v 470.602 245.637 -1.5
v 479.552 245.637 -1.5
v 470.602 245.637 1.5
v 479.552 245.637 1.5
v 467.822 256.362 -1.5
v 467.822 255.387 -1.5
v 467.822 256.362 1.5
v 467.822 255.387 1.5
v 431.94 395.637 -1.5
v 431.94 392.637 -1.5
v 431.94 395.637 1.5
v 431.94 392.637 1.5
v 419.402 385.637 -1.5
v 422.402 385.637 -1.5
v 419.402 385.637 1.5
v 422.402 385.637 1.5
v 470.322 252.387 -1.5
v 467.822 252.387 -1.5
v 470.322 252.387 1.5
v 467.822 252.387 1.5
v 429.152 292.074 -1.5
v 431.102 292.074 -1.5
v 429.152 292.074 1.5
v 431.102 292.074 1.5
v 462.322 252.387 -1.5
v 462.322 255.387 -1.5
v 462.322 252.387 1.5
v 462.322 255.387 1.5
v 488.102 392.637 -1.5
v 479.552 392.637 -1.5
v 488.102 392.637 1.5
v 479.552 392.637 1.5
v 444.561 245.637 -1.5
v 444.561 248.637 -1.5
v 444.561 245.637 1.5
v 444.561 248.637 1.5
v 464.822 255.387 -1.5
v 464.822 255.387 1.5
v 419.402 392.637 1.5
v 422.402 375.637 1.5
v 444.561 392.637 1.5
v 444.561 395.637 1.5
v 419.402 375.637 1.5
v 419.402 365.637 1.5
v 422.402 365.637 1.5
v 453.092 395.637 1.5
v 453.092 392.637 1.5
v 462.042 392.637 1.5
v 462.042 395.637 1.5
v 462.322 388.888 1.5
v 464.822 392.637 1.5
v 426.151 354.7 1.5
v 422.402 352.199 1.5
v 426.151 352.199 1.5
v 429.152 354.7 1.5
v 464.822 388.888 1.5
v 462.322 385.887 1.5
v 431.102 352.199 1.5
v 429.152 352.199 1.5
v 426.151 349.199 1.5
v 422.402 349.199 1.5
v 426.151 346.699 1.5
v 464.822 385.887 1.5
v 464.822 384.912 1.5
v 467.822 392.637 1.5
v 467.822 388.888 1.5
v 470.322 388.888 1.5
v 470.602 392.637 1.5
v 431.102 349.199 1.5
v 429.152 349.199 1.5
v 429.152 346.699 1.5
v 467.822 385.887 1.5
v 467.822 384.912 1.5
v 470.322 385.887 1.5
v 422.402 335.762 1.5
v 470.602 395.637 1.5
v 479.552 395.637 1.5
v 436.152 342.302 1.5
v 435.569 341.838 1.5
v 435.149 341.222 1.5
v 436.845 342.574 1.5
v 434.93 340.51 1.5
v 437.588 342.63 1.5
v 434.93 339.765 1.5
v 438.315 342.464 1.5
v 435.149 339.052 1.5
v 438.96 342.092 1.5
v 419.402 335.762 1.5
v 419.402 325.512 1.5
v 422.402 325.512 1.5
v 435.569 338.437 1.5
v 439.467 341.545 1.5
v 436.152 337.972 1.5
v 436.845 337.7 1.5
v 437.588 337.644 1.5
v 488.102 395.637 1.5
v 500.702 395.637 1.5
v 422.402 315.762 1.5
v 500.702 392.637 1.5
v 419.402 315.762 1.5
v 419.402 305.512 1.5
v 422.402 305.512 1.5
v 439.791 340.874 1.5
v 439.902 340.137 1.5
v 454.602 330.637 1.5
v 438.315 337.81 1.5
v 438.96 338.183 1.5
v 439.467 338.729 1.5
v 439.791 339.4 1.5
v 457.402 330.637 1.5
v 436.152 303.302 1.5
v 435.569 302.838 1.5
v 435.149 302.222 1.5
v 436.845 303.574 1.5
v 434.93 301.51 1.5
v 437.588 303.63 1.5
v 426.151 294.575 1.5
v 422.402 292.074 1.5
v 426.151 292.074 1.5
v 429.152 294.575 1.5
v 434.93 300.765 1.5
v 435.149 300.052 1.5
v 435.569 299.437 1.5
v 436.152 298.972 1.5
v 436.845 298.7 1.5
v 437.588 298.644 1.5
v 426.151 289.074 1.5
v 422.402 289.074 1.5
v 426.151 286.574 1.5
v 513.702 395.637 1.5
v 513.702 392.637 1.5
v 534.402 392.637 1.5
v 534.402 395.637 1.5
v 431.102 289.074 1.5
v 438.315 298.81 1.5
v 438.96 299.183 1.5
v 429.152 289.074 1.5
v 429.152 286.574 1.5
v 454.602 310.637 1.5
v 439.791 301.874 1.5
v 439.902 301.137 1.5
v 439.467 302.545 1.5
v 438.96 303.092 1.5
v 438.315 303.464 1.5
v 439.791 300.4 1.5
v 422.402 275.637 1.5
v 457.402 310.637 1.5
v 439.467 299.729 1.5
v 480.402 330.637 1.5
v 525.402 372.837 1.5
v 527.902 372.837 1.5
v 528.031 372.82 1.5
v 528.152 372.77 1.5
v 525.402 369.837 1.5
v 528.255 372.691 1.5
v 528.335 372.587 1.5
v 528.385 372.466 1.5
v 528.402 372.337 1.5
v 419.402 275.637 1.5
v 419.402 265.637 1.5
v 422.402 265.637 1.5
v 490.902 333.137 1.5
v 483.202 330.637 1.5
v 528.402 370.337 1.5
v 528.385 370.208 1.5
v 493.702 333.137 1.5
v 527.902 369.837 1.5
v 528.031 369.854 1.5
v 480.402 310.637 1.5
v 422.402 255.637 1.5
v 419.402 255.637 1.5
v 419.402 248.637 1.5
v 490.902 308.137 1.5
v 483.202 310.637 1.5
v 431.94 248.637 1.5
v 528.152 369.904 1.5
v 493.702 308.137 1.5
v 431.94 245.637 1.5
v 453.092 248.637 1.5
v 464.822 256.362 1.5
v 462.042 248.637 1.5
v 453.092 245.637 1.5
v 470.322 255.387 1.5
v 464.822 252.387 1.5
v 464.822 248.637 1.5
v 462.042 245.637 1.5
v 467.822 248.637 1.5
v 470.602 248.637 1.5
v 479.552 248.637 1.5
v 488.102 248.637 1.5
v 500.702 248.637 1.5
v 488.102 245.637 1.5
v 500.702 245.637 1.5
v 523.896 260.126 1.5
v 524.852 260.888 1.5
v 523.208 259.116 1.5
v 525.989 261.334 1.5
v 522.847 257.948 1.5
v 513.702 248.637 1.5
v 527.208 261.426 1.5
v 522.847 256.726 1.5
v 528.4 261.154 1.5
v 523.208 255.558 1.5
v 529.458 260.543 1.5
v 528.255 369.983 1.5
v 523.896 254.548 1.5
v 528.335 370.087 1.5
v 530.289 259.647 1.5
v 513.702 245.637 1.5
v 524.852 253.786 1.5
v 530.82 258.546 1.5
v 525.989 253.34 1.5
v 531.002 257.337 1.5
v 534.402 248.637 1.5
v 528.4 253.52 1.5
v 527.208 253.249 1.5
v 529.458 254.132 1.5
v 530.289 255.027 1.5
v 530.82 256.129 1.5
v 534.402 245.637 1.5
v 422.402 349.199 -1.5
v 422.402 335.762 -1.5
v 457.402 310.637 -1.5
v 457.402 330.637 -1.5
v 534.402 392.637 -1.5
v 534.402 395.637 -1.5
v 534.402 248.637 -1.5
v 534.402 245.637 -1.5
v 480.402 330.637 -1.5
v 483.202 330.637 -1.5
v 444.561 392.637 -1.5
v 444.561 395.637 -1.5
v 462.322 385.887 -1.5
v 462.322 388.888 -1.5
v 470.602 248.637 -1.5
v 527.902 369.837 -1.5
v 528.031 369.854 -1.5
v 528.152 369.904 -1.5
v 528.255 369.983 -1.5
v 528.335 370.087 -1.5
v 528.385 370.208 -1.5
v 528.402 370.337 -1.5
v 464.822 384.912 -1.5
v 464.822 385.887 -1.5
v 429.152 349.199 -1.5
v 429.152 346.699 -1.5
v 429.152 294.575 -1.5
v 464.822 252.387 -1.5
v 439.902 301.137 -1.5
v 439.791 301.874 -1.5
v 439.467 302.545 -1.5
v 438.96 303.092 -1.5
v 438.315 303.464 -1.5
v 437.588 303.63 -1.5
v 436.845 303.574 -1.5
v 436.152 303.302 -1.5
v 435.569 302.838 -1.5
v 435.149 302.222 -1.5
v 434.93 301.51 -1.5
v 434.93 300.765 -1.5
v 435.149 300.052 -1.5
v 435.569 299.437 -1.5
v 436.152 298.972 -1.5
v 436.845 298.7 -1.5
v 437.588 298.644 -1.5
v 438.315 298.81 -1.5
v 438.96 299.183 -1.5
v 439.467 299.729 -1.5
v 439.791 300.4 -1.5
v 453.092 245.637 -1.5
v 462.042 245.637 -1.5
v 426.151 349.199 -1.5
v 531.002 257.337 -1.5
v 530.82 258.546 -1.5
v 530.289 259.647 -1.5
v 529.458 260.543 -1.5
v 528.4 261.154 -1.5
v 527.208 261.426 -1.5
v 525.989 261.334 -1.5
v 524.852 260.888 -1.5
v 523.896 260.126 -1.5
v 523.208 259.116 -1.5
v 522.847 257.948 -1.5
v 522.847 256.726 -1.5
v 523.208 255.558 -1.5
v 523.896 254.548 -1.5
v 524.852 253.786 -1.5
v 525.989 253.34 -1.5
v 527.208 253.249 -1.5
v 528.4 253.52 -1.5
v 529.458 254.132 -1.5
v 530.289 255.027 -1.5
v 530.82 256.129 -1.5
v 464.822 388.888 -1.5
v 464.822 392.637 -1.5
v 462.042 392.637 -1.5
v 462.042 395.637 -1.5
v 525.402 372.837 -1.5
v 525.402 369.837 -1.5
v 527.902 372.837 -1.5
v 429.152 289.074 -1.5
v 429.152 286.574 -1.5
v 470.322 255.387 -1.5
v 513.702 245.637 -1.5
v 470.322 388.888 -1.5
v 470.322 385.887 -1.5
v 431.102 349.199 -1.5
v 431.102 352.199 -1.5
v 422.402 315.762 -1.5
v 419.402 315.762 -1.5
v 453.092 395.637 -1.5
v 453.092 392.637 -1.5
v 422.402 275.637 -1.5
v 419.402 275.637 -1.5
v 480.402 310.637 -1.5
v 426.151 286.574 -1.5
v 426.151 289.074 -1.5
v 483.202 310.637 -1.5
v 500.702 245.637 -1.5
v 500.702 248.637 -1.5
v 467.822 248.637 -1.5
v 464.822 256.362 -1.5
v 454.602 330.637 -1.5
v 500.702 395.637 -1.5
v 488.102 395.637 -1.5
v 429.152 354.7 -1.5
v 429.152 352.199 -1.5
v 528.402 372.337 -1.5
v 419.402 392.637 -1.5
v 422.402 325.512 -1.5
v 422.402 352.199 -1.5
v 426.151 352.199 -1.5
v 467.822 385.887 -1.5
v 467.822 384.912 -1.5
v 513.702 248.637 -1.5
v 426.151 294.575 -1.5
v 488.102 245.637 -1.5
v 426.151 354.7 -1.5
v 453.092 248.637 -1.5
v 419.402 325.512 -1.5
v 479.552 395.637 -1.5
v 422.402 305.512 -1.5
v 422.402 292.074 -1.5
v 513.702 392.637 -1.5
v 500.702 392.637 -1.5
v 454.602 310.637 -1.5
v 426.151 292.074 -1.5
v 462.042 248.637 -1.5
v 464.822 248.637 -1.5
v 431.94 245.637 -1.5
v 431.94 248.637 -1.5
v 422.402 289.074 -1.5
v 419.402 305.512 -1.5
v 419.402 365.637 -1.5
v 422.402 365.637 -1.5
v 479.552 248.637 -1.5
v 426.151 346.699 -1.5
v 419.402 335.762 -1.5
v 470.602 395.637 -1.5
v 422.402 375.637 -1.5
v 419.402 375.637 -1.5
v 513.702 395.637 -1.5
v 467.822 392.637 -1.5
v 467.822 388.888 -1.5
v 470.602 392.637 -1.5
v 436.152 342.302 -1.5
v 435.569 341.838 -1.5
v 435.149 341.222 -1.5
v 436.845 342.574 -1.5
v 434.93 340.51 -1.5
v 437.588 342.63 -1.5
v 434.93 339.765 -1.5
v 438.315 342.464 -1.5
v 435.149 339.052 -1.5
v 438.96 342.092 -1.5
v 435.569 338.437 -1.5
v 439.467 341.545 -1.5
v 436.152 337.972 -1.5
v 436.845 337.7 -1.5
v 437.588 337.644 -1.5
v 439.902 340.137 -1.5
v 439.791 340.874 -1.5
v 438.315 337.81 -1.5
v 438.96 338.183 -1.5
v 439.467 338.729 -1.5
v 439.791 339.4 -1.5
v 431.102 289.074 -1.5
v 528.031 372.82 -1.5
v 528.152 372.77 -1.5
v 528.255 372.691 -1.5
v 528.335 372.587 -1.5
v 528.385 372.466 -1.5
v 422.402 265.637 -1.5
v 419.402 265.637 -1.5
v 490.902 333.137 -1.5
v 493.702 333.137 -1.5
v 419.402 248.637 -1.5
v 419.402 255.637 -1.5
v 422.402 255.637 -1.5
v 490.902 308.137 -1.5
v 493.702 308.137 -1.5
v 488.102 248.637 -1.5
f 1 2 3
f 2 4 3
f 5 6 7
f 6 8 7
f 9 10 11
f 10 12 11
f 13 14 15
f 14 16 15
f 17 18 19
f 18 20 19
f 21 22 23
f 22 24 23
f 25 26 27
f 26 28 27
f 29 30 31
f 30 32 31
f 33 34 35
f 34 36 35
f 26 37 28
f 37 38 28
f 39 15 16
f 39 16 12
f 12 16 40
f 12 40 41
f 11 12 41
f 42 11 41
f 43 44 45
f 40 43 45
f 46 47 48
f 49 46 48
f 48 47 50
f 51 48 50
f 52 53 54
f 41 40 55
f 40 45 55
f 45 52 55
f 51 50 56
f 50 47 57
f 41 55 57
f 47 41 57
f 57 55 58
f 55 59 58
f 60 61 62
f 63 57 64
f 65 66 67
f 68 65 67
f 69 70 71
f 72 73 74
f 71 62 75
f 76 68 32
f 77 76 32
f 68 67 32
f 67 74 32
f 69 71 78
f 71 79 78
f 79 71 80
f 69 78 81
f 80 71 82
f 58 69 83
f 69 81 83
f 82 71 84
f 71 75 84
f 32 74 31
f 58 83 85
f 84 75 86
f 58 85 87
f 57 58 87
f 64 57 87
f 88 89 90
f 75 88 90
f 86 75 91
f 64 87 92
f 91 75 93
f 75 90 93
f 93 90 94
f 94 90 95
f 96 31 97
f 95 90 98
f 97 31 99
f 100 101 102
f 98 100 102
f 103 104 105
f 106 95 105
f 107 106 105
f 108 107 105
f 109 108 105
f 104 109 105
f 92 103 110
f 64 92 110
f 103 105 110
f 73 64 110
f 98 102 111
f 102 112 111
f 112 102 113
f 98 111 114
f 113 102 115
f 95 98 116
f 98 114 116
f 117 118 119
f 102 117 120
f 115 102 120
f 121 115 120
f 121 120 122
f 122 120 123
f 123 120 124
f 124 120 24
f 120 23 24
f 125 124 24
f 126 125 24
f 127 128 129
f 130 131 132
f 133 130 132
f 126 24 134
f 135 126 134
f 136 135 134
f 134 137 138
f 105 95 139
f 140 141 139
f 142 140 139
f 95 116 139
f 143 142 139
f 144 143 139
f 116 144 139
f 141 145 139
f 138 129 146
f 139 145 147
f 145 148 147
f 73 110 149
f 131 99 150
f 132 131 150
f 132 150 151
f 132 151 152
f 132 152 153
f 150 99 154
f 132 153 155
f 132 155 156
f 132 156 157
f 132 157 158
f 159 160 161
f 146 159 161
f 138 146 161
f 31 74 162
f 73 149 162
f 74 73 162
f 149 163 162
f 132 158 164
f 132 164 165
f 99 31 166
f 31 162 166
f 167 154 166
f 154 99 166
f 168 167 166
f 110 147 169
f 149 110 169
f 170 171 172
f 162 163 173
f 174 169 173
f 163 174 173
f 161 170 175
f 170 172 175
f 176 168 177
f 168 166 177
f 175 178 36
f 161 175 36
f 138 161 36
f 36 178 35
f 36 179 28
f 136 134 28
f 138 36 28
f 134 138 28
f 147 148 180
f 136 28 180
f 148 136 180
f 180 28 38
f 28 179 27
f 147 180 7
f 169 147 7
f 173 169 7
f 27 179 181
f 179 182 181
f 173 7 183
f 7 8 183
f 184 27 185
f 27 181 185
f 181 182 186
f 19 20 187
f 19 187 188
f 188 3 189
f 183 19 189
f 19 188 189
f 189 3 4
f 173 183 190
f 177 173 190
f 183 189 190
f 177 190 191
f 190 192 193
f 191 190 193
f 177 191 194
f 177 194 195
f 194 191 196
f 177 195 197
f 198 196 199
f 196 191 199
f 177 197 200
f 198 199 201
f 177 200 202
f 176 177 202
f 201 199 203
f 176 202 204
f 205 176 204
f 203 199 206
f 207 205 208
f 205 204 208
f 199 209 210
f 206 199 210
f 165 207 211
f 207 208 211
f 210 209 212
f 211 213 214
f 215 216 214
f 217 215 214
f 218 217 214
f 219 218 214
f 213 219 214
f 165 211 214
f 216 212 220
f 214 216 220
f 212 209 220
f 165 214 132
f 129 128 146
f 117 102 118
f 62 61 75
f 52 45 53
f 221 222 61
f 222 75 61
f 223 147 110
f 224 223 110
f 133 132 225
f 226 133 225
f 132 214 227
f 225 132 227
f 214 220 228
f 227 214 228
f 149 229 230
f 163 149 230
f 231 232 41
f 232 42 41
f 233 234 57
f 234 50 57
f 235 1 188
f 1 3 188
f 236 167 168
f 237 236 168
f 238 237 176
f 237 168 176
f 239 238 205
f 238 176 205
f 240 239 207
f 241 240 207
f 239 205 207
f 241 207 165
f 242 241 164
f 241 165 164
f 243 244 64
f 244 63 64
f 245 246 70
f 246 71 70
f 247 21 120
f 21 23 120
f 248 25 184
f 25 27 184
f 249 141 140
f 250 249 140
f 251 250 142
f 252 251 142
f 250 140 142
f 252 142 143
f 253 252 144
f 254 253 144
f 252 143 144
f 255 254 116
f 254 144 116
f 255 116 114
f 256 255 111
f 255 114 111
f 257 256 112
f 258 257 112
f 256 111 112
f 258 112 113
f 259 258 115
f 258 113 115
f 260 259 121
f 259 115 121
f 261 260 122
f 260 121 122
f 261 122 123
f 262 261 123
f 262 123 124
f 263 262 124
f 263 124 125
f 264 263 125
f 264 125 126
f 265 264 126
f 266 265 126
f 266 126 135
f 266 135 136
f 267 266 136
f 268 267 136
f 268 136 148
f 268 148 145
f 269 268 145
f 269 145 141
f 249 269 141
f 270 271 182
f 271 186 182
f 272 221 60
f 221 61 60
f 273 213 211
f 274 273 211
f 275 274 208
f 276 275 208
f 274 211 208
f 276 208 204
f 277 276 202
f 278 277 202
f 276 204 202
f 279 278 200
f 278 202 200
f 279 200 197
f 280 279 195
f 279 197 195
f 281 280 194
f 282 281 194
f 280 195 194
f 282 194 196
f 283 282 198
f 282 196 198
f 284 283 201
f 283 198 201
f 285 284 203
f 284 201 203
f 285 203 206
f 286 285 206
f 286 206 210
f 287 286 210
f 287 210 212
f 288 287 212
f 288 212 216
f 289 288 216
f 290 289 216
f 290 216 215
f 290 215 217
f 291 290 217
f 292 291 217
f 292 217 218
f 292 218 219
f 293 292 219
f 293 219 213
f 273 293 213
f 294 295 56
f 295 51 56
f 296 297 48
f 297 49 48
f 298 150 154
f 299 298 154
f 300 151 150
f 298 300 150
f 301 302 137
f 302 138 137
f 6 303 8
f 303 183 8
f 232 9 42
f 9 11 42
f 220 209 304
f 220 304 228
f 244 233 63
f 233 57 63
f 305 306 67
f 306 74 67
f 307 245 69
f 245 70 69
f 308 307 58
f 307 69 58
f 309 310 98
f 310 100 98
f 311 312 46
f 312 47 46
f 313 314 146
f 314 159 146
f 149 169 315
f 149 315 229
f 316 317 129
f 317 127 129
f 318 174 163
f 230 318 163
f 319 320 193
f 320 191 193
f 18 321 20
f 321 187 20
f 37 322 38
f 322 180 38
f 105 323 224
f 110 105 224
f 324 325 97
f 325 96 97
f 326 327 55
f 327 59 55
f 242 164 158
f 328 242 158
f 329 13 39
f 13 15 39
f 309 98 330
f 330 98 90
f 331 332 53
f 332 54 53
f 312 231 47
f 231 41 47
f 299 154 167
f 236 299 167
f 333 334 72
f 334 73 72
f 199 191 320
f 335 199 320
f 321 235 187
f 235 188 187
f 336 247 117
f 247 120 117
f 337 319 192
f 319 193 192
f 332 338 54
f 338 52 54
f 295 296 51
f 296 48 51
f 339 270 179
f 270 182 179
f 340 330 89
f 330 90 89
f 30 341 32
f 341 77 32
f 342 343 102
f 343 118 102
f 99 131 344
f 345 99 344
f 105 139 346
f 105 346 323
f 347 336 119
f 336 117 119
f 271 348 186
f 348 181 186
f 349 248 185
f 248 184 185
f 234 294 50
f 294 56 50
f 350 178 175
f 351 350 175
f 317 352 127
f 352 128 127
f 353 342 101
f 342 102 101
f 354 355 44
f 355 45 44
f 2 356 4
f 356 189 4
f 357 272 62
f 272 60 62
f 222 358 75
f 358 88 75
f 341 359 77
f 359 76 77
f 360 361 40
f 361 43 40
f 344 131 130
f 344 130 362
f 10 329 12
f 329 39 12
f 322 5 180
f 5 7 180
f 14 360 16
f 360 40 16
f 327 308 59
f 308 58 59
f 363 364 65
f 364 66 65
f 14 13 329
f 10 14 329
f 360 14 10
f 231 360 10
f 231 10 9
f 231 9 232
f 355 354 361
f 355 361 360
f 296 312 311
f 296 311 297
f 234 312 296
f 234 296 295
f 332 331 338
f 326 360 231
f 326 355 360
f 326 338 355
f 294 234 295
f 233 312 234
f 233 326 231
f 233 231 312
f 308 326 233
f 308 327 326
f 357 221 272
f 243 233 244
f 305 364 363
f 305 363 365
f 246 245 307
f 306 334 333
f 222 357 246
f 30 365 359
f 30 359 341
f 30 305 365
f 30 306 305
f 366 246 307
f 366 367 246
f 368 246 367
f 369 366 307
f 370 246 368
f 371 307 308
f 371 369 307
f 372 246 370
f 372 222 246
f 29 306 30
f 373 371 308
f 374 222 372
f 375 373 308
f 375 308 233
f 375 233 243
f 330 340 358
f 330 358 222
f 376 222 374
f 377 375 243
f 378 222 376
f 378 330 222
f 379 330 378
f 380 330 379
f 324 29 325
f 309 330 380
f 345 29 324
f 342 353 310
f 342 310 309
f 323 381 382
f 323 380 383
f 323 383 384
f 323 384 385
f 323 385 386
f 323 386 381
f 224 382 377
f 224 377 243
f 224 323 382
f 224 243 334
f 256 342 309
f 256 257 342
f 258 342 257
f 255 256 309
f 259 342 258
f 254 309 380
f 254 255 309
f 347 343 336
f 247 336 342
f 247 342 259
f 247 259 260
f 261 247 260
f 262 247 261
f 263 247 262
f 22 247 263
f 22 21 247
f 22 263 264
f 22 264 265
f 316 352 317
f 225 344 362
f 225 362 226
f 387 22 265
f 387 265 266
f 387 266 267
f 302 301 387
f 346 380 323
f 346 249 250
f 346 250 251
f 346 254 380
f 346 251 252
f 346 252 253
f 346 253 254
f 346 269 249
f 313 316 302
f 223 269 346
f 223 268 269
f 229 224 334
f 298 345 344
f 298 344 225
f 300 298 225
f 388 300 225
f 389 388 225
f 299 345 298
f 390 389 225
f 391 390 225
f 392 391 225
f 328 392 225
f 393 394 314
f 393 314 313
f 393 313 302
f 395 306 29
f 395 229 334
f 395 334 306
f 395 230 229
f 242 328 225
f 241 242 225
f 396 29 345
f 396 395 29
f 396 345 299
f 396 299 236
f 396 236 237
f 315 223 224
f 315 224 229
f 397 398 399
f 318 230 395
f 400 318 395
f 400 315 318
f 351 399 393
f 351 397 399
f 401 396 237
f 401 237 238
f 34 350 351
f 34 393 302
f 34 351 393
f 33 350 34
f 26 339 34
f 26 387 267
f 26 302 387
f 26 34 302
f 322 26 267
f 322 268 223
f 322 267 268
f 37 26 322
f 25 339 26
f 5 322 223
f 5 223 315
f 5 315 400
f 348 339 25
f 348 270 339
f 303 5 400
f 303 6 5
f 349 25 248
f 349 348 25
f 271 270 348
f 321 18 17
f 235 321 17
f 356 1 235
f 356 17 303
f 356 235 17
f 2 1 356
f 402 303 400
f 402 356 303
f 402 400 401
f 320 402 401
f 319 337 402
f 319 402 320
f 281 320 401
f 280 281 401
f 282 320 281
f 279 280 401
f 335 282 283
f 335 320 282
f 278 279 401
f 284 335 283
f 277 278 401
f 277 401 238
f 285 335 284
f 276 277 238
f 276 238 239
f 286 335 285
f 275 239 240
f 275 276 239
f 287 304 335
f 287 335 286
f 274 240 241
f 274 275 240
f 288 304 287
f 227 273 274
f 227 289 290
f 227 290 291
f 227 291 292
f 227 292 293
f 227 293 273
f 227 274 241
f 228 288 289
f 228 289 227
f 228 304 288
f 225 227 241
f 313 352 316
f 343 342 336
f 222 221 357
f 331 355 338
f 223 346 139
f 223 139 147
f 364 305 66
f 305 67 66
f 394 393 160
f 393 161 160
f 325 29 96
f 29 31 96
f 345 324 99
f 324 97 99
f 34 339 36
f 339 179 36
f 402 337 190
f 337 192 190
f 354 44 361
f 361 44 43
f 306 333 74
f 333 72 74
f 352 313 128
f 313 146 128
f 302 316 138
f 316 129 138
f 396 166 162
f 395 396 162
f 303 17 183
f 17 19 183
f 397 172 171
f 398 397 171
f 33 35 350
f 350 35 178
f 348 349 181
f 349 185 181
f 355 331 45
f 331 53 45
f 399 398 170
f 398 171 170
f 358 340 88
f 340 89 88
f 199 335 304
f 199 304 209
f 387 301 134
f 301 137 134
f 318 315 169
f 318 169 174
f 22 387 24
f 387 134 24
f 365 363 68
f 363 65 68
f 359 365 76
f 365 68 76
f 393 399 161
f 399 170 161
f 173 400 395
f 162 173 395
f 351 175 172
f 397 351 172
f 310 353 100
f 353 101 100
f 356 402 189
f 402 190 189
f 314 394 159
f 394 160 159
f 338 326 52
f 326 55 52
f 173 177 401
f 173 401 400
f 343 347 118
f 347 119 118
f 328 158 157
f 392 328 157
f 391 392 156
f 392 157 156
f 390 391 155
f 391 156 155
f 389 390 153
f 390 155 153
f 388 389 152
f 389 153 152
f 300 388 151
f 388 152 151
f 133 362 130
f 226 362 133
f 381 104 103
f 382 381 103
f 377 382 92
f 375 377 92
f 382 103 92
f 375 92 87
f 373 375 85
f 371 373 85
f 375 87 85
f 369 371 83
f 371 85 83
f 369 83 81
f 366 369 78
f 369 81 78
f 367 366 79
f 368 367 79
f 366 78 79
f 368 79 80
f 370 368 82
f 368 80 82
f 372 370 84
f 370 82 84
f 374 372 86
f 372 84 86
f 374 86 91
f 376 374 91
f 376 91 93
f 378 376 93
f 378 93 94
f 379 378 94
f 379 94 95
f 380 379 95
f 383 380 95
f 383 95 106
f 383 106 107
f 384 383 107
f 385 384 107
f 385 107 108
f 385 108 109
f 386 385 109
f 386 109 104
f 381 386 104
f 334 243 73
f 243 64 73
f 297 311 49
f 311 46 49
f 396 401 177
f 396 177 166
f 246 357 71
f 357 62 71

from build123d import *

# Parameters (mm, degrees)
SALIENTE_EXTRUIR1_DEPTH = 1.5
CROQUIS2_W              = 2.8
CROQUIS2_H              = 20
CROQUIS2_R              = 2.5
CORTAR_EXTRUIR1_DEPTH   = 11
CROQUIS4_W              = 2.8
CROQUIS4_H              = 25
CORTAR_EXTRUIR3_DEPTH   = 13
CROQUIS5_W              = 3
CROQUIS5_H              = 144.0002072
SALIENTE_EXTRUIR2_DEPTH = 15
CROQUIS6_R              = 4.1
CORTAR_EXTRUIR4_DEPTH   = 15
CROQUIS7_W              = 20.699997517
CROQUIS7_H              = 3
SALIENTE_EXTRUIR3_DEPTH = 3
CROQUIS8_W              = 20.699997553
CROQUIS8_H              = 3
SALIENTE_EXTRUIR4_DEPTH = 3


with BuildPart() as part:
    # Croquis1 → Saliente-Extruir1 (new, symmetric)
    with BuildSketch(Plane.XY):
        Polygon((419.401663173, 255.63715478), (419.401663173, 248.637154823), (431.940346335, 248.637154823), (431.940346335, 245.637154782), (444.561007707, 245.63714943), (444.561007707, 248.637149514), (453.092348458, 248.637149514), (453.092348458, 245.637149514), (462.042348456, 245.637149514), (462.042348456, 248.637116576), (464.821999726, 248.637116576), (464.821999726, 252.386767599), (462.321999727, 252.386767599), (462.321999727, 255.387116575), (464.821999726, 255.387116575), (464.821999726, 256.362116575), (467.821999725, 256.362116575), (467.821999725, 255.387116575), (470.322418497, 255.387116575), (470.322418497, 252.386767599), (467.821999725, 252.386767599), (467.821999725, 248.637116576), (470.601650995, 248.637116576), (470.601650995, 245.637116577), (479.551650993, 245.637116577), (479.551650993, 248.637039563), (488.101650991, 248.637039563), (488.101650991, 245.637039564), (500.701660131, 245.637039564), (500.701660131, 248.637051166), (519.401657648, 248.637051166), (519.401657648, 392.637258366), (500.701660095, 392.637258366), (500.701660095, 395.637269968), (488.101650956, 395.637269968), (488.101650956, 392.637269969), (479.551650957, 392.637269969), (479.551650957, 395.637192955), (470.601650959, 395.637192955), (470.601650959, 392.637192956), (467.82199969, 392.637192956), (467.82199969, 388.887541933), (470.322418461, 388.887541933), (470.322418461, 385.887192957), (467.82199969, 385.887192957), (467.82199969, 384.912192957), (464.82199969, 384.912192957), (464.82199969, 385.887192957), (462.321999691, 385.887192957), (462.321999691, 388.887541933), (464.82199969, 388.887541933), (464.82199969, 392.637192956), (462.04234842, 392.637192956), (462.04234842, 395.637160018), (453.092348422, 395.637160018), (453.092348422, 392.637160018), (444.561007671, 392.637160018), (444.561007671, 395.637160103), (431.9403463, 395.637154751), (431.9403463, 392.637154709), (419.401663173, 392.637154709), (419.401663173, 385.637154752), (422.401663173, 385.637154752), (422.401663173, 375.637154754), (419.401663173, 375.637154754), (419.401663173, 365.637154757), (422.401663173, 365.637154757), (422.401663173, 352.199445373), (426.151314195, 352.199445373), (426.151314195, 354.699864145), (429.151663171, 354.699864145), (429.151663171, 352.199445373), (431.101663171, 352.199445373), (431.101663171, 349.199445374), (429.151663171, 349.199445374), (429.151663171, 346.699445374), (426.151314195, 346.699445374), (426.151314195, 349.199445374), (422.401663173, 349.199445374), (422.401663173, 335.762154763), (419.401663173, 335.762154763), (419.401663173, 325.512154765), (422.401663173, 325.512154765), (422.401663173, 315.762154767), (419.401663173, 315.762154767), (419.401663173, 305.512154769), (422.401663173, 305.512154769), (422.401663173, 292.074445386), (426.151314195, 292.074445386), (426.151314195, 294.574864158), (429.151663171, 294.574864158), (429.151663171, 292.074445386), (431.101663171, 292.074445386), (431.101663171, 289.074445387), (429.151663171, 289.074445387), (429.151663171, 286.574445387), (426.151314195, 286.574445387), (426.151314195, 289.074445387), (422.401663173, 289.074445387), (422.401663173, 275.637154776), (419.401663173, 275.637154776), (419.401663173, 265.637154778), (422.401663173, 265.637154778), (422.401663173, 255.63715478), align=None)
    extrude(amount=SALIENTE_EXTRUIR1_DEPTH, both=True)

    # Croquis2 → Cortar-Extruir1 (cut)
    with BuildSketch(Plane.XY.offset(1.5)):
        with Locations((481.801663173, 320.637154766)):
            Rectangle(CROQUIS2_W, CROQUIS2_H)
        with Locations((456.001663173, 320.637154766)):
            Rectangle(CROQUIS2_W, CROQUIS2_H)
        with Locations((437.401663173, 340.137154766)):
            Circle(CROQUIS2_R)
        with Locations((437.401663173, 301.137154766)):
            Circle(CROQUIS2_R)
    extrude(amount=-CORTAR_EXTRUIR1_DEPTH, mode=Mode.SUBTRACT)

    # Croquis4 → Cortar-Extruir3 (cut)
    with BuildSketch(Plane(origin=(0, 0, -1.5), x_dir=(-1, 0, 0), z_dir=(0, 0, -1))):
        with Locations((-492.30166041, 320.637154766)):
            Rectangle(CROQUIS4_W, CROQUIS4_H)
    extrude(amount=-CORTAR_EXTRUIR3_DEPTH, mode=Mode.SUBTRACT)

    # Croquis5 → Saliente-Extruir2 (add)
    with BuildSketch(Plane(origin=(519.401657648, 0, 0), x_dir=(0, 0, -1), z_dir=(1, 0, 0))):
        with Locations((0, 320.637154766)):
            Rectangle(CROQUIS5_W, CROQUIS5_H)
    extrude(amount=SALIENTE_EXTRUIR2_DEPTH)

    # Croquis6 → Cortar-Extruir4 (cut)
    with BuildSketch(Plane.XY.offset(1.5)):
        with Locations((526.901657648, 257.337051166)):
            Circle(CROQUIS6_R)
        with BuildLine():
            Line((525.401657648, 369.837051166), (527.901657648, 369.837051166))
            ThreePointArc((527.901657648, 369.837051166), (528.255211039, 369.983497775), (528.401657648, 370.337051166))
            Line((528.401657648, 370.337051166), (528.401657648, 372.337051166))
            ThreePointArc((528.401657648, 372.337051166), (528.255211039, 372.690604556), (527.901657648, 372.837051166))
            Line((527.901657648, 372.837051166), (525.401657648, 372.837051166))
            Line((525.401657648, 372.837051166), (525.401657648, 369.837051166))
        make_face()
    extrude(amount=-CORTAR_EXTRUIR4_DEPTH, mode=Mode.SUBTRACT)

    # Croquis7 → Saliente-Extruir3 (add)
    with BuildSketch(Plane.XZ.offset(-248.637051166)):
        with Locations((524.05165889, 0)):
            Rectangle(CROQUIS7_W, CROQUIS7_H)
    extrude(amount=SALIENTE_EXTRUIR3_DEPTH)

    # Croquis8 → Saliente-Extruir4 (add)
    with BuildSketch(Plane(origin=(0, 392.637258366, 0), x_dir=(1, 0, 0), z_dir=(0, 1, 0))):
        with Locations((524.051658872, 0)):
            Rectangle(CROQUIS8_W, CROQUIS8_H)
    extrude(amount=SALIENTE_EXTRUIR4_DEPTH)


solid = part.part
